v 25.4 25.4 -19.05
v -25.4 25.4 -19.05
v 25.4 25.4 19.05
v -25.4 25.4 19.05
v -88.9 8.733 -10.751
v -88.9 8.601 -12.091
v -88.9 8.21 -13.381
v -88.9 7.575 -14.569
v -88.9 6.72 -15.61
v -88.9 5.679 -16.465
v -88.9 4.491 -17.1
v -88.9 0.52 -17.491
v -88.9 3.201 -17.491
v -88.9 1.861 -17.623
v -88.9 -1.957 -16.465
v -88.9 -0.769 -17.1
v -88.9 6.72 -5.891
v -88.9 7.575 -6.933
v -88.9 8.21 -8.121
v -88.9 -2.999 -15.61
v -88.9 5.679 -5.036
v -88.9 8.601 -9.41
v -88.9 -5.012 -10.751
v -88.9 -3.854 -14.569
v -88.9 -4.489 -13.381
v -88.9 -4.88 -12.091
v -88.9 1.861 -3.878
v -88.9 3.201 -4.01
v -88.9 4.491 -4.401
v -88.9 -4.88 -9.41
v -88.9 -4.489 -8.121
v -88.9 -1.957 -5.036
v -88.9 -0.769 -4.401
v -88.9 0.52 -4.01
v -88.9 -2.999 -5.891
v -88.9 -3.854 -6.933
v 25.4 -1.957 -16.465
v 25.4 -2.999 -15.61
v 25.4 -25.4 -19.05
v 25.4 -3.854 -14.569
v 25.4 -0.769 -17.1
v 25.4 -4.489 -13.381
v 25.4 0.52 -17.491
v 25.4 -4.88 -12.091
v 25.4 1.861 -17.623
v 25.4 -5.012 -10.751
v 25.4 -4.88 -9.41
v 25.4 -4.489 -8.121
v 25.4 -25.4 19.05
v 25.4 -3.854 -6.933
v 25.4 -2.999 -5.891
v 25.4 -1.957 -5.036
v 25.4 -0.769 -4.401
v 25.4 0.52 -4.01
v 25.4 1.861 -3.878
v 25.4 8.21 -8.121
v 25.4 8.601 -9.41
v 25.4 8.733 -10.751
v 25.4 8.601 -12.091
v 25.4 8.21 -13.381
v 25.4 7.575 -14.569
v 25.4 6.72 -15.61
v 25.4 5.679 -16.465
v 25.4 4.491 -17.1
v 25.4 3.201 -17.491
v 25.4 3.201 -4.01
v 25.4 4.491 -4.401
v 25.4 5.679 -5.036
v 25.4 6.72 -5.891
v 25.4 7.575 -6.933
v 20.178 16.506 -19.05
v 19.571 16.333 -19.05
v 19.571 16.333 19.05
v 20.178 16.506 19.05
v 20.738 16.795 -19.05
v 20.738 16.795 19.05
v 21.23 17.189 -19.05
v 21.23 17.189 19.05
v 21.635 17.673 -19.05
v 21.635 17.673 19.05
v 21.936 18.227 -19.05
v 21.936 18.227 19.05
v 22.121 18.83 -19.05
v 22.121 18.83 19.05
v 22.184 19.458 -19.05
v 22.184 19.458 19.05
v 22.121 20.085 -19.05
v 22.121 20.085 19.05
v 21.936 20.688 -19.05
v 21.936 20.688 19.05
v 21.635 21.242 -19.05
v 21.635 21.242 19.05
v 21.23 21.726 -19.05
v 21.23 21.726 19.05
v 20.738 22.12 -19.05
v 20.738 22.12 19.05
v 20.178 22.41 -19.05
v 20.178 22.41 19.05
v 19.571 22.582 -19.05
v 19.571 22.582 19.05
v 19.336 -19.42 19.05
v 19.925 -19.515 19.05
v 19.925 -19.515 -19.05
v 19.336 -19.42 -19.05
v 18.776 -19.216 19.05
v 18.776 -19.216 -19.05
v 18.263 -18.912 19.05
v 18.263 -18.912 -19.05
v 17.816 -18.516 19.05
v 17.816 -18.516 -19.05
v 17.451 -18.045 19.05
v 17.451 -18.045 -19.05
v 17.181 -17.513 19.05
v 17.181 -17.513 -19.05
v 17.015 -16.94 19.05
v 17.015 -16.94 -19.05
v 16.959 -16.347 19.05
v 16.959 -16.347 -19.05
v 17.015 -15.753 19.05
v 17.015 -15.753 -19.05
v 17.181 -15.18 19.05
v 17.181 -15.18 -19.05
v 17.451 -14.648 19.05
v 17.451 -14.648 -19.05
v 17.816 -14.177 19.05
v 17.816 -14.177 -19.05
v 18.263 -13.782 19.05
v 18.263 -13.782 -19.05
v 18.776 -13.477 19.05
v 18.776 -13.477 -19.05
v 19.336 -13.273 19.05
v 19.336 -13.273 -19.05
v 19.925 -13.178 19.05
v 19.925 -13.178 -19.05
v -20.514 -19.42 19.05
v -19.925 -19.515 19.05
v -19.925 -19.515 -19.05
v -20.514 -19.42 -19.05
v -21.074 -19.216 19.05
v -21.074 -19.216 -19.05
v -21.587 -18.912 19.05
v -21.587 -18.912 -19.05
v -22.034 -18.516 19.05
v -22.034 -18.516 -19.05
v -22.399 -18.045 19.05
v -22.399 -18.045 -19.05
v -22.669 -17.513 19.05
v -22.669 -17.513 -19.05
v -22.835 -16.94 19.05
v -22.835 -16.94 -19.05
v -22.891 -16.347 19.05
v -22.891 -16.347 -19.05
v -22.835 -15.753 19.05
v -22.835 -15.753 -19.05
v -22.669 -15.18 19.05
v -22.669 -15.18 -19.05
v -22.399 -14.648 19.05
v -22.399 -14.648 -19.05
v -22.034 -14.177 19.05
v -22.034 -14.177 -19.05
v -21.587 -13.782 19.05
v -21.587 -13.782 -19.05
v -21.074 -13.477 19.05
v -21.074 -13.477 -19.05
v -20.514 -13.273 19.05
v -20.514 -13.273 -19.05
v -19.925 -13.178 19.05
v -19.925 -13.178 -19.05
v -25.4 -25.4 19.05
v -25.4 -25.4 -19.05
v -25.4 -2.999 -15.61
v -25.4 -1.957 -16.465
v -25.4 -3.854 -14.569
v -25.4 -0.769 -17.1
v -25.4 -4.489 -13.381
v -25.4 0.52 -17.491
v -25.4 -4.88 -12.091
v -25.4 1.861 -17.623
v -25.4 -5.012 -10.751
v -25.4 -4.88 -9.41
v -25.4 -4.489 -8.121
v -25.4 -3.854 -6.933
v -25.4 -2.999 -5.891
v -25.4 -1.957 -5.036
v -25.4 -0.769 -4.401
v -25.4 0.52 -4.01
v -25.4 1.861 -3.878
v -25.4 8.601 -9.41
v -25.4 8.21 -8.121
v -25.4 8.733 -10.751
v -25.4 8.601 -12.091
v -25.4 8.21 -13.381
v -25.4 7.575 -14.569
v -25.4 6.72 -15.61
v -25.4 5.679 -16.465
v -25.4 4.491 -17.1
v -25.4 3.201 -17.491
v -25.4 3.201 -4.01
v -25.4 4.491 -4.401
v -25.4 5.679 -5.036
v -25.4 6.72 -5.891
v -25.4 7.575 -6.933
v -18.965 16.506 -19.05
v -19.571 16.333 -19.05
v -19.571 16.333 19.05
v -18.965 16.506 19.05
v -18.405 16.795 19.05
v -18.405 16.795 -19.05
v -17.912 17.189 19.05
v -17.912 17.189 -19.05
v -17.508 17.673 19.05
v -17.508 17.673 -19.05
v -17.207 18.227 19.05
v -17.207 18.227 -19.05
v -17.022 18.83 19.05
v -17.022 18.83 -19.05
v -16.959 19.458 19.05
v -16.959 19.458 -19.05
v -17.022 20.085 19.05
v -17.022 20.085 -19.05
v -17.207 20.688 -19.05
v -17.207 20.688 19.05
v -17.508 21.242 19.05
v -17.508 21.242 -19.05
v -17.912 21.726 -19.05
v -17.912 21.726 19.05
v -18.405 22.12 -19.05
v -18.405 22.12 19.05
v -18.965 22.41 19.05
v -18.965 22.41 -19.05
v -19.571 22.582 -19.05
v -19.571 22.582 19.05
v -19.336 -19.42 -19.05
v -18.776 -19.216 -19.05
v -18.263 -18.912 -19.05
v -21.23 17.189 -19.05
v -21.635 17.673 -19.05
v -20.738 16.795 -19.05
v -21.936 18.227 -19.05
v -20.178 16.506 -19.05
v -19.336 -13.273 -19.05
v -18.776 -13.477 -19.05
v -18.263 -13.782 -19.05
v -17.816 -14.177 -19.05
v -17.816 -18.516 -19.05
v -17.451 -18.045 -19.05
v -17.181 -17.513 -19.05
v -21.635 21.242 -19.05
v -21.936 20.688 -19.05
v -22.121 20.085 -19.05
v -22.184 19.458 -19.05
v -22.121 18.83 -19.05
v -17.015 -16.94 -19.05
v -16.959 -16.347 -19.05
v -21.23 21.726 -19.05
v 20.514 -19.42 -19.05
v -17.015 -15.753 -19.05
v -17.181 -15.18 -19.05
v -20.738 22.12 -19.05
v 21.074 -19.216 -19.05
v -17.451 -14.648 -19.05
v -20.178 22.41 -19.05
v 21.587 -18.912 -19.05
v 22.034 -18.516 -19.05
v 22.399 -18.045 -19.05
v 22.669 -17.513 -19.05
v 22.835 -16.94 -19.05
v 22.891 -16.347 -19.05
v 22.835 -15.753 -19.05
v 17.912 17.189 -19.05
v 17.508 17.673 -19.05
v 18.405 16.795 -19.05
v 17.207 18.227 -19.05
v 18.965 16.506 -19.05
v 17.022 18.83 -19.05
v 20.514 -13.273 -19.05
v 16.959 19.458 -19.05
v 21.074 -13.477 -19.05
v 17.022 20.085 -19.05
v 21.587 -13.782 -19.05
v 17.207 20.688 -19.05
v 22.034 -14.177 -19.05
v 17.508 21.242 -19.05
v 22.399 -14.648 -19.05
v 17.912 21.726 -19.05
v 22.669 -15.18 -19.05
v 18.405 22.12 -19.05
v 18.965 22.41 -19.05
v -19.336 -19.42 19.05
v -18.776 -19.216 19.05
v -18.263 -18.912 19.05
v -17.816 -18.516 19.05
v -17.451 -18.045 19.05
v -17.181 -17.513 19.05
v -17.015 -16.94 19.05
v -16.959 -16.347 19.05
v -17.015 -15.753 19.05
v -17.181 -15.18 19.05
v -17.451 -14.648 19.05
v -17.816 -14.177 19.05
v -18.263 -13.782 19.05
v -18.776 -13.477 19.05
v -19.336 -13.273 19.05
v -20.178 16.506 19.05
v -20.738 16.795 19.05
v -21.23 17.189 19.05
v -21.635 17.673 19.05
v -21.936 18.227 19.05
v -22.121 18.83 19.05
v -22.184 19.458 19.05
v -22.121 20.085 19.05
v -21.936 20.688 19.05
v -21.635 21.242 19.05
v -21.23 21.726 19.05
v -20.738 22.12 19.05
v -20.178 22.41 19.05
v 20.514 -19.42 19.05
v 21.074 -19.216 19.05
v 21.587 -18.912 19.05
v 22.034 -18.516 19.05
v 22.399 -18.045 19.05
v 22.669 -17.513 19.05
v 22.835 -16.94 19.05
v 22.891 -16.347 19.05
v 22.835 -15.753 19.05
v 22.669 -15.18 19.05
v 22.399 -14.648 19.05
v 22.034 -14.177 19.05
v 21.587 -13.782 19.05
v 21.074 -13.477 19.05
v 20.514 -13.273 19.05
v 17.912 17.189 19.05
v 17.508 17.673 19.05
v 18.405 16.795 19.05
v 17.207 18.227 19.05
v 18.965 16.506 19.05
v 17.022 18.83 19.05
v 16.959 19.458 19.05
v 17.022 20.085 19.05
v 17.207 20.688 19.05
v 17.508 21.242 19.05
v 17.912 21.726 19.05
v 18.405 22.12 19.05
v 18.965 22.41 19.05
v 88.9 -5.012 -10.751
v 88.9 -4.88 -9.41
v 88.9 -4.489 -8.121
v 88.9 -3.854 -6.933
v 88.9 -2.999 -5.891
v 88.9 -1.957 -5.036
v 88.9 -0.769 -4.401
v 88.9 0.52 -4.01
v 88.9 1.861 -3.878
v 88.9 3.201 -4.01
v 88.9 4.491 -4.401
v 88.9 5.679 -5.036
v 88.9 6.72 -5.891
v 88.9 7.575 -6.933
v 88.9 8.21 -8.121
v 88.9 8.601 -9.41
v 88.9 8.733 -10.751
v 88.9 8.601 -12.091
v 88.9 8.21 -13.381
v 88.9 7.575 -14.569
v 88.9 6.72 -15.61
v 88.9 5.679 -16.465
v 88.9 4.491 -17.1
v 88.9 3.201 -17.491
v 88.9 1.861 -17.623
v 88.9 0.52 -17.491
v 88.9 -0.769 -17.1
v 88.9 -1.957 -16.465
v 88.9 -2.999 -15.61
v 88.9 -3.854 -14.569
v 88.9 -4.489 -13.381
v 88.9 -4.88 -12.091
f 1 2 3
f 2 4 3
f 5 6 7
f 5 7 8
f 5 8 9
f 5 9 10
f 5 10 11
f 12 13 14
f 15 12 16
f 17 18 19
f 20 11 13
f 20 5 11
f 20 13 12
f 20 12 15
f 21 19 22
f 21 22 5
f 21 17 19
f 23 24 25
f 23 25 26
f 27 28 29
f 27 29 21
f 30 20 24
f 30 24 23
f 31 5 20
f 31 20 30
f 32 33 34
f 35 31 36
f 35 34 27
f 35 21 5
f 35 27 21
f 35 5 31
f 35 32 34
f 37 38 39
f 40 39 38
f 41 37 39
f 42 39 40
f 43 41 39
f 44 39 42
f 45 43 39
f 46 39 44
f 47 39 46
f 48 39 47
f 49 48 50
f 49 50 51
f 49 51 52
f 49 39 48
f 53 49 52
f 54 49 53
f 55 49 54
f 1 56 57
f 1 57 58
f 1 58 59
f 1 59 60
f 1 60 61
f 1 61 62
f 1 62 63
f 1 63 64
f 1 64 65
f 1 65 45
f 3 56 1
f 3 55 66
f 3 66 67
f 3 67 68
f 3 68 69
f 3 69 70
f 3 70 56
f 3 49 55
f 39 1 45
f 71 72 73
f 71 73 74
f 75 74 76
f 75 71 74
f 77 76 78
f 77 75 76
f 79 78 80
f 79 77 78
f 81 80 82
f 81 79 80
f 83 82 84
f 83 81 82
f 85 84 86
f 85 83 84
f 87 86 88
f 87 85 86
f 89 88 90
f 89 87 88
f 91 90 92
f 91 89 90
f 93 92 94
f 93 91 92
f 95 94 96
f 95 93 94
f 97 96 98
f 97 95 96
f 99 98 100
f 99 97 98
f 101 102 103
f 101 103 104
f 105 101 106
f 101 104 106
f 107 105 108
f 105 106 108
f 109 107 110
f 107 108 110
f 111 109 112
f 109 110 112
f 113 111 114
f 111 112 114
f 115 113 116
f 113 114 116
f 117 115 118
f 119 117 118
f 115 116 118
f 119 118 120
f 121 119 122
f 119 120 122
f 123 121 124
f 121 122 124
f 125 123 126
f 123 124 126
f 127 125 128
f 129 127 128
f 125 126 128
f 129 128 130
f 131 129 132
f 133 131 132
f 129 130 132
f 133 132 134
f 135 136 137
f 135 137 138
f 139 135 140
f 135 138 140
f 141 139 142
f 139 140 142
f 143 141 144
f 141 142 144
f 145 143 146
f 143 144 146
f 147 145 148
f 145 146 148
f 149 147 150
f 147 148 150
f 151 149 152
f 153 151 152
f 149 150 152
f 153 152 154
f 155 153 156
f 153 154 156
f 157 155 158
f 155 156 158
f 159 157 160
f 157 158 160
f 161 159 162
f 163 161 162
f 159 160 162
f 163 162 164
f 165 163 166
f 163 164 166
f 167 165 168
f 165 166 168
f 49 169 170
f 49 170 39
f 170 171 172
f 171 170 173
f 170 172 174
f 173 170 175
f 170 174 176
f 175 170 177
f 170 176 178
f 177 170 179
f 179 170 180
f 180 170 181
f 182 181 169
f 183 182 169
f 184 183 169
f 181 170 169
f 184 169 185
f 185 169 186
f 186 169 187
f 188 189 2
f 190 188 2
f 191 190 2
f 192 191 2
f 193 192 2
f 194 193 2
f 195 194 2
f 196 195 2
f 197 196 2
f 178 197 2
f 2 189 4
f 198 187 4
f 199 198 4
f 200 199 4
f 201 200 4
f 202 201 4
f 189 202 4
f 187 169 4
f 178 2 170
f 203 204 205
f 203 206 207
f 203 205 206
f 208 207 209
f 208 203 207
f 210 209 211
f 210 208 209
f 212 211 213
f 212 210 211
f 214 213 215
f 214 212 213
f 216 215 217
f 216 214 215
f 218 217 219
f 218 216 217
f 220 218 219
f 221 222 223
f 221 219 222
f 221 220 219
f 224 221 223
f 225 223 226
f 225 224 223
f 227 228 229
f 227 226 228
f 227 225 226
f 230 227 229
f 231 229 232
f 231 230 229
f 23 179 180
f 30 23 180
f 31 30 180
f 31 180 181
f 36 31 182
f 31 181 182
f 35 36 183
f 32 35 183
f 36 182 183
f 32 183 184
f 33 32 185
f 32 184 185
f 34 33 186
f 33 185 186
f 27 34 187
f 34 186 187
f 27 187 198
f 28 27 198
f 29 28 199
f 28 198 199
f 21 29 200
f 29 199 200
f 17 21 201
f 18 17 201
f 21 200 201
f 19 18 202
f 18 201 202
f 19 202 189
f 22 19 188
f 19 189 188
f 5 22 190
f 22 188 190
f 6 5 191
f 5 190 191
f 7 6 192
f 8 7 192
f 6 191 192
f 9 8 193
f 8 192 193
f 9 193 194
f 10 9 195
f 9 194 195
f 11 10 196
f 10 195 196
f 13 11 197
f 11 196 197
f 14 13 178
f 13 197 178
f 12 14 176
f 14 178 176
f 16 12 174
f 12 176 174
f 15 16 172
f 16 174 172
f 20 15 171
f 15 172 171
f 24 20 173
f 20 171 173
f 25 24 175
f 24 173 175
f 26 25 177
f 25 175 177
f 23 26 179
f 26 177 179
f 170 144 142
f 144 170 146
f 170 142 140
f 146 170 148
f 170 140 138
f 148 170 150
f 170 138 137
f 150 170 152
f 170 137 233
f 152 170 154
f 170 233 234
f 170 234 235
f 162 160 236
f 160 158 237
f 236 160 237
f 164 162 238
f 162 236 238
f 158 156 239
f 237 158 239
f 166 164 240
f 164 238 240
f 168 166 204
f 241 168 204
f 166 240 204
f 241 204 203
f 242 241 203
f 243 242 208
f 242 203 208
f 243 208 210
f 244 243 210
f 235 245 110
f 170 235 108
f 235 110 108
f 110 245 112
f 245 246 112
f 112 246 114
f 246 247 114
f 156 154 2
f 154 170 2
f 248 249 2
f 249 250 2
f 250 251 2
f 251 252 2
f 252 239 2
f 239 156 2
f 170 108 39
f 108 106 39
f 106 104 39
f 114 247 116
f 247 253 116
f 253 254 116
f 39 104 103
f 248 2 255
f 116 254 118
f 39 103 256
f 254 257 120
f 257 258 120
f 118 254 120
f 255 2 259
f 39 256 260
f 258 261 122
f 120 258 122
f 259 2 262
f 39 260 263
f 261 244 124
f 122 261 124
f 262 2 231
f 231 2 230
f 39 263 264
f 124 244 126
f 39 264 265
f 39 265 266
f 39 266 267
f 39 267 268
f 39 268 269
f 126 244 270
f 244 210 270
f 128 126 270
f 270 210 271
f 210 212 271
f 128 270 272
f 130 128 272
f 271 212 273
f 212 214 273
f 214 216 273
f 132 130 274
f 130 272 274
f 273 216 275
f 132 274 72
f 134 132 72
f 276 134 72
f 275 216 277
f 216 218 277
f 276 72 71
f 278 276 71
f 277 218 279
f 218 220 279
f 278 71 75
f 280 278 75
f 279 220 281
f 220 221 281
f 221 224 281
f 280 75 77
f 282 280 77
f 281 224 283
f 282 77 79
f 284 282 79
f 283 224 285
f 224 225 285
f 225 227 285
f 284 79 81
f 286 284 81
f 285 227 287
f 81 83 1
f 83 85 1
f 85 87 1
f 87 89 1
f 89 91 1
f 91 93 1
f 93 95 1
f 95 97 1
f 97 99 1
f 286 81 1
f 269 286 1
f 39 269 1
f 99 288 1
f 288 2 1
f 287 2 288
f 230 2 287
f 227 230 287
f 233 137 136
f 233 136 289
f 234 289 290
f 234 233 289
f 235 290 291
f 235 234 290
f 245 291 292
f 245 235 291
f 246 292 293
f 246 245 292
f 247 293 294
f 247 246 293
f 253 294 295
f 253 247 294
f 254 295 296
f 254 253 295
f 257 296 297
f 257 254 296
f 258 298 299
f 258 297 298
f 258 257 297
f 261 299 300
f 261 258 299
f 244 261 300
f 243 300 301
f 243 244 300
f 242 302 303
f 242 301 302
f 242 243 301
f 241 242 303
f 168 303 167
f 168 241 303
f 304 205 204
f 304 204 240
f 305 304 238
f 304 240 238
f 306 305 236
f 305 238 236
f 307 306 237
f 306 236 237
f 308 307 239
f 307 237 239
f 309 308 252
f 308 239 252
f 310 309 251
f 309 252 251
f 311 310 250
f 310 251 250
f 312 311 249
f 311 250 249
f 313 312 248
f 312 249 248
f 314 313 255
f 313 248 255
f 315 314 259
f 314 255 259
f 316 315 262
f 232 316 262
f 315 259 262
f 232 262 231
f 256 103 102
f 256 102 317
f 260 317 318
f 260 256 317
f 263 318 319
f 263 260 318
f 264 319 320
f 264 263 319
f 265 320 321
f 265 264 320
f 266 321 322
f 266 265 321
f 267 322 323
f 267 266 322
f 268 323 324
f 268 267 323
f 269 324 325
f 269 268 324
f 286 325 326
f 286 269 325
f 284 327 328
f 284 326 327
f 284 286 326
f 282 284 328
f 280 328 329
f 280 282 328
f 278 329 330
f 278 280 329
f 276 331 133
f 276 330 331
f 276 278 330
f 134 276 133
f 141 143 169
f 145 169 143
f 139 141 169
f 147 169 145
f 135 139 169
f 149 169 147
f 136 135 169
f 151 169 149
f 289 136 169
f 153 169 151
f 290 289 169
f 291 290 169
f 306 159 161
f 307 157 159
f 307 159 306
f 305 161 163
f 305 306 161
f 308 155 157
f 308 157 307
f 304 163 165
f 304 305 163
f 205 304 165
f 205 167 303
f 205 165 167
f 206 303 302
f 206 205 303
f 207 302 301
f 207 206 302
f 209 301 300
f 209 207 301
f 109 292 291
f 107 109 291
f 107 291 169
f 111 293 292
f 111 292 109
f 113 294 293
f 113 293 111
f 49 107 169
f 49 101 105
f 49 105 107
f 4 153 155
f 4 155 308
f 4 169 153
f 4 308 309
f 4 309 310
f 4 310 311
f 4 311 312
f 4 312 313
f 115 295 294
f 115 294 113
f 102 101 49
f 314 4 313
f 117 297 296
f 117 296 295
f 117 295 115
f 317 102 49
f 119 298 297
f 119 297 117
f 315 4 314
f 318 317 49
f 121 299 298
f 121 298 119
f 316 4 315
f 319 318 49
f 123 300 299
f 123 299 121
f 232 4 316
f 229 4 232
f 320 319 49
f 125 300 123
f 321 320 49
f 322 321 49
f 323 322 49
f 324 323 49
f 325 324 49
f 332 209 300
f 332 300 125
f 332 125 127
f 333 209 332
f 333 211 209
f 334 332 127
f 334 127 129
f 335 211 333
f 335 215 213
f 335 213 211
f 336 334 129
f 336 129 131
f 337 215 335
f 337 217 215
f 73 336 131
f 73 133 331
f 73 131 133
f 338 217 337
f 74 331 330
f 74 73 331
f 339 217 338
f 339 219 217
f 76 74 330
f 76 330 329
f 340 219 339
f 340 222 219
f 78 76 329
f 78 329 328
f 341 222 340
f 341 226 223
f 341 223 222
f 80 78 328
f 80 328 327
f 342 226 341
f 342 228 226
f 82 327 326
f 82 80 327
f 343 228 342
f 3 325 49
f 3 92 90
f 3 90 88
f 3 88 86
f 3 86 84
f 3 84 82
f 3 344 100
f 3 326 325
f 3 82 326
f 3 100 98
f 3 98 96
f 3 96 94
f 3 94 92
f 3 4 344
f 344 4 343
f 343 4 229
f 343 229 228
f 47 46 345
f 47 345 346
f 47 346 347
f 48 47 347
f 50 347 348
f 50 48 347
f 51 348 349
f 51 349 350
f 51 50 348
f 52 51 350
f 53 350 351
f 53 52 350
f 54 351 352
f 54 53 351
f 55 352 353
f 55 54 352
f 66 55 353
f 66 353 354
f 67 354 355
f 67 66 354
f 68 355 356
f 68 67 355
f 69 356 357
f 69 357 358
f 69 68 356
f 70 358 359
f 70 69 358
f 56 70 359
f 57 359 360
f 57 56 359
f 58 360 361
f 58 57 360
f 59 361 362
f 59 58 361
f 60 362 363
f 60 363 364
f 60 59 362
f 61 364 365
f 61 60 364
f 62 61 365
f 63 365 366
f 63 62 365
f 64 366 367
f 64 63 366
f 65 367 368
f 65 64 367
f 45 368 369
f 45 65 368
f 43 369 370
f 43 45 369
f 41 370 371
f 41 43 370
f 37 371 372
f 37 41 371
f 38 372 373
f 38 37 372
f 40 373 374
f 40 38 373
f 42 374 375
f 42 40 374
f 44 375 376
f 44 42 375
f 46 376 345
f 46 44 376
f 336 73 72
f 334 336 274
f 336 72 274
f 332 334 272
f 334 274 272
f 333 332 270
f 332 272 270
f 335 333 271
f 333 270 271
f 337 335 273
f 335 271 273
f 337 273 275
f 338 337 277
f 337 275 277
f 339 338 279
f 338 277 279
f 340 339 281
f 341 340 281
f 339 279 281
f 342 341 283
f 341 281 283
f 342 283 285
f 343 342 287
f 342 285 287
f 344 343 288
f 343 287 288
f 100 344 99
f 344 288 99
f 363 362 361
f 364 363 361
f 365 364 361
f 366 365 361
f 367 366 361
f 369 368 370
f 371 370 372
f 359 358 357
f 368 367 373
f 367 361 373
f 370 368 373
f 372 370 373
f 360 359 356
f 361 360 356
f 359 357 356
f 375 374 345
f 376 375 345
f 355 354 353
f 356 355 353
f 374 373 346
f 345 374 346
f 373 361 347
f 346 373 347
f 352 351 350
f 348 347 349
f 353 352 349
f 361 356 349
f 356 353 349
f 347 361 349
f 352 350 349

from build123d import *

# Parameters (mm, degrees)
F0_W     = 50.8
F0_H     = 50.8
F0_R     = 3.175
F1_DEPTH = 19.05
F2_R     = 6.872495
F3_DEPTH = 63.5


with BuildPart() as f1:
    # F0 (on Top) → F1 (new body, symmetric)
    with BuildSketch(Plane.XY):
        Rectangle(F0_W, F0_H)
        with Locations((-20.133952, -16.346581)):
            Circle(F0_R, mode=Mode.SUBTRACT)
        with Locations((19.715946, -16.346581)):
            Circle(F0_R, mode=Mode.SUBTRACT)
        with Locations((-20.133952, 19.457644)):
            Circle(F0_R, mode=Mode.SUBTRACT)
        with Locations((19.008903, 19.457644)):
            Circle(F0_R, mode=Mode.SUBTRACT)
    extrude(amount=F1_DEPTH, both=True)

    # F2 (on face) → F3 (join)
    with BuildSketch(Plane(origin=(-25.4, 0, 0), x_dir=(0, -1, 0), z_dir=(-1, 0, 0))):
        with Locations((-1.860697, -10.750698)):
            Circle(F2_R)
    extrude(amount=F3_DEPTH)

    # F4: F1 across plane


with BuildPart() as f1_1:
    add(f1.part)
    add(f1.part.mirror(Plane.YZ))


solid = f1_1.part
